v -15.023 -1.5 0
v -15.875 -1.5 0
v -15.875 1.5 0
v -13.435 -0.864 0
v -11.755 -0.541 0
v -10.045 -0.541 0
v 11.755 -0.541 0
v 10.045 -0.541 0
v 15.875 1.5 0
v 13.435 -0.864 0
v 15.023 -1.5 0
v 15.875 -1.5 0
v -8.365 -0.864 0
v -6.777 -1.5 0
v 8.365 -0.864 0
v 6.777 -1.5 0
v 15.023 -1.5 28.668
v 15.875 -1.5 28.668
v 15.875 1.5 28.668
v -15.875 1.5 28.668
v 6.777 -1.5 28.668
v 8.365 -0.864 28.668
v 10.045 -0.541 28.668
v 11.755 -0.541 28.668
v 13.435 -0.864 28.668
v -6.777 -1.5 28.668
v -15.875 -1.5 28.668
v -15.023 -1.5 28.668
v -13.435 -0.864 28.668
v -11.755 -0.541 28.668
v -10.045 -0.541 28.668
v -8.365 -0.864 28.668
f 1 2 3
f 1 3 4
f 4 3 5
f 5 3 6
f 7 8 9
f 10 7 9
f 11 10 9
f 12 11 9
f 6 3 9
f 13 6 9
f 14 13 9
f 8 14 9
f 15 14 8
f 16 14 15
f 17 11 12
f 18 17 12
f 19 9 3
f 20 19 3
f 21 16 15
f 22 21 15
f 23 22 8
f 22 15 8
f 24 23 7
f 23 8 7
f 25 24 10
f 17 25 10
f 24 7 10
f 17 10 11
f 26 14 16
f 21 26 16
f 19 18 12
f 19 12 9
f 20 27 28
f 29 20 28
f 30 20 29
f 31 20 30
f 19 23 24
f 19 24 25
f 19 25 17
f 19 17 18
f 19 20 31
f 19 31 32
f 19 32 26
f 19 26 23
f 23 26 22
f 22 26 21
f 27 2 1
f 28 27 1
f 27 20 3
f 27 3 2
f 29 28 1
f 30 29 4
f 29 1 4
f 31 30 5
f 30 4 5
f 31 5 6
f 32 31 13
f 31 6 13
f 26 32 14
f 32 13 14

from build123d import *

# Parameters (mm, degrees)
BOSS_EXTRUDE1_DEPTH = 28.668


with BuildPart() as part:
    # Sketch1 → Boss-Extrude1 (new body)
    with BuildSketch(Plane.XY):
        with BuildLine():
            Line((-15.875, -1.5), (-15.023105626, -1.5))
            ThreePointArc((-15.023105626, -1.5), (-10.9, -0.5), (-6.776894374, -1.5))
            Line((-6.776894374, -1.5), (6.776894374, -1.5))
            ThreePointArc((6.776894374, -1.5), (10.9, -0.5), (15.023105626, -1.5))
            Line((15.023105626, -1.5), (15.875, -1.5))
            Line((15.875, -1.5), (15.875, 1.5))
            Line((15.875, 1.5), (-15.875, 1.5))
            Line((-15.875, 1.5), (-15.875, -1.5))
        make_face()
    extrude(amount=BOSS_EXTRUDE1_DEPTH)


solid = part.part
